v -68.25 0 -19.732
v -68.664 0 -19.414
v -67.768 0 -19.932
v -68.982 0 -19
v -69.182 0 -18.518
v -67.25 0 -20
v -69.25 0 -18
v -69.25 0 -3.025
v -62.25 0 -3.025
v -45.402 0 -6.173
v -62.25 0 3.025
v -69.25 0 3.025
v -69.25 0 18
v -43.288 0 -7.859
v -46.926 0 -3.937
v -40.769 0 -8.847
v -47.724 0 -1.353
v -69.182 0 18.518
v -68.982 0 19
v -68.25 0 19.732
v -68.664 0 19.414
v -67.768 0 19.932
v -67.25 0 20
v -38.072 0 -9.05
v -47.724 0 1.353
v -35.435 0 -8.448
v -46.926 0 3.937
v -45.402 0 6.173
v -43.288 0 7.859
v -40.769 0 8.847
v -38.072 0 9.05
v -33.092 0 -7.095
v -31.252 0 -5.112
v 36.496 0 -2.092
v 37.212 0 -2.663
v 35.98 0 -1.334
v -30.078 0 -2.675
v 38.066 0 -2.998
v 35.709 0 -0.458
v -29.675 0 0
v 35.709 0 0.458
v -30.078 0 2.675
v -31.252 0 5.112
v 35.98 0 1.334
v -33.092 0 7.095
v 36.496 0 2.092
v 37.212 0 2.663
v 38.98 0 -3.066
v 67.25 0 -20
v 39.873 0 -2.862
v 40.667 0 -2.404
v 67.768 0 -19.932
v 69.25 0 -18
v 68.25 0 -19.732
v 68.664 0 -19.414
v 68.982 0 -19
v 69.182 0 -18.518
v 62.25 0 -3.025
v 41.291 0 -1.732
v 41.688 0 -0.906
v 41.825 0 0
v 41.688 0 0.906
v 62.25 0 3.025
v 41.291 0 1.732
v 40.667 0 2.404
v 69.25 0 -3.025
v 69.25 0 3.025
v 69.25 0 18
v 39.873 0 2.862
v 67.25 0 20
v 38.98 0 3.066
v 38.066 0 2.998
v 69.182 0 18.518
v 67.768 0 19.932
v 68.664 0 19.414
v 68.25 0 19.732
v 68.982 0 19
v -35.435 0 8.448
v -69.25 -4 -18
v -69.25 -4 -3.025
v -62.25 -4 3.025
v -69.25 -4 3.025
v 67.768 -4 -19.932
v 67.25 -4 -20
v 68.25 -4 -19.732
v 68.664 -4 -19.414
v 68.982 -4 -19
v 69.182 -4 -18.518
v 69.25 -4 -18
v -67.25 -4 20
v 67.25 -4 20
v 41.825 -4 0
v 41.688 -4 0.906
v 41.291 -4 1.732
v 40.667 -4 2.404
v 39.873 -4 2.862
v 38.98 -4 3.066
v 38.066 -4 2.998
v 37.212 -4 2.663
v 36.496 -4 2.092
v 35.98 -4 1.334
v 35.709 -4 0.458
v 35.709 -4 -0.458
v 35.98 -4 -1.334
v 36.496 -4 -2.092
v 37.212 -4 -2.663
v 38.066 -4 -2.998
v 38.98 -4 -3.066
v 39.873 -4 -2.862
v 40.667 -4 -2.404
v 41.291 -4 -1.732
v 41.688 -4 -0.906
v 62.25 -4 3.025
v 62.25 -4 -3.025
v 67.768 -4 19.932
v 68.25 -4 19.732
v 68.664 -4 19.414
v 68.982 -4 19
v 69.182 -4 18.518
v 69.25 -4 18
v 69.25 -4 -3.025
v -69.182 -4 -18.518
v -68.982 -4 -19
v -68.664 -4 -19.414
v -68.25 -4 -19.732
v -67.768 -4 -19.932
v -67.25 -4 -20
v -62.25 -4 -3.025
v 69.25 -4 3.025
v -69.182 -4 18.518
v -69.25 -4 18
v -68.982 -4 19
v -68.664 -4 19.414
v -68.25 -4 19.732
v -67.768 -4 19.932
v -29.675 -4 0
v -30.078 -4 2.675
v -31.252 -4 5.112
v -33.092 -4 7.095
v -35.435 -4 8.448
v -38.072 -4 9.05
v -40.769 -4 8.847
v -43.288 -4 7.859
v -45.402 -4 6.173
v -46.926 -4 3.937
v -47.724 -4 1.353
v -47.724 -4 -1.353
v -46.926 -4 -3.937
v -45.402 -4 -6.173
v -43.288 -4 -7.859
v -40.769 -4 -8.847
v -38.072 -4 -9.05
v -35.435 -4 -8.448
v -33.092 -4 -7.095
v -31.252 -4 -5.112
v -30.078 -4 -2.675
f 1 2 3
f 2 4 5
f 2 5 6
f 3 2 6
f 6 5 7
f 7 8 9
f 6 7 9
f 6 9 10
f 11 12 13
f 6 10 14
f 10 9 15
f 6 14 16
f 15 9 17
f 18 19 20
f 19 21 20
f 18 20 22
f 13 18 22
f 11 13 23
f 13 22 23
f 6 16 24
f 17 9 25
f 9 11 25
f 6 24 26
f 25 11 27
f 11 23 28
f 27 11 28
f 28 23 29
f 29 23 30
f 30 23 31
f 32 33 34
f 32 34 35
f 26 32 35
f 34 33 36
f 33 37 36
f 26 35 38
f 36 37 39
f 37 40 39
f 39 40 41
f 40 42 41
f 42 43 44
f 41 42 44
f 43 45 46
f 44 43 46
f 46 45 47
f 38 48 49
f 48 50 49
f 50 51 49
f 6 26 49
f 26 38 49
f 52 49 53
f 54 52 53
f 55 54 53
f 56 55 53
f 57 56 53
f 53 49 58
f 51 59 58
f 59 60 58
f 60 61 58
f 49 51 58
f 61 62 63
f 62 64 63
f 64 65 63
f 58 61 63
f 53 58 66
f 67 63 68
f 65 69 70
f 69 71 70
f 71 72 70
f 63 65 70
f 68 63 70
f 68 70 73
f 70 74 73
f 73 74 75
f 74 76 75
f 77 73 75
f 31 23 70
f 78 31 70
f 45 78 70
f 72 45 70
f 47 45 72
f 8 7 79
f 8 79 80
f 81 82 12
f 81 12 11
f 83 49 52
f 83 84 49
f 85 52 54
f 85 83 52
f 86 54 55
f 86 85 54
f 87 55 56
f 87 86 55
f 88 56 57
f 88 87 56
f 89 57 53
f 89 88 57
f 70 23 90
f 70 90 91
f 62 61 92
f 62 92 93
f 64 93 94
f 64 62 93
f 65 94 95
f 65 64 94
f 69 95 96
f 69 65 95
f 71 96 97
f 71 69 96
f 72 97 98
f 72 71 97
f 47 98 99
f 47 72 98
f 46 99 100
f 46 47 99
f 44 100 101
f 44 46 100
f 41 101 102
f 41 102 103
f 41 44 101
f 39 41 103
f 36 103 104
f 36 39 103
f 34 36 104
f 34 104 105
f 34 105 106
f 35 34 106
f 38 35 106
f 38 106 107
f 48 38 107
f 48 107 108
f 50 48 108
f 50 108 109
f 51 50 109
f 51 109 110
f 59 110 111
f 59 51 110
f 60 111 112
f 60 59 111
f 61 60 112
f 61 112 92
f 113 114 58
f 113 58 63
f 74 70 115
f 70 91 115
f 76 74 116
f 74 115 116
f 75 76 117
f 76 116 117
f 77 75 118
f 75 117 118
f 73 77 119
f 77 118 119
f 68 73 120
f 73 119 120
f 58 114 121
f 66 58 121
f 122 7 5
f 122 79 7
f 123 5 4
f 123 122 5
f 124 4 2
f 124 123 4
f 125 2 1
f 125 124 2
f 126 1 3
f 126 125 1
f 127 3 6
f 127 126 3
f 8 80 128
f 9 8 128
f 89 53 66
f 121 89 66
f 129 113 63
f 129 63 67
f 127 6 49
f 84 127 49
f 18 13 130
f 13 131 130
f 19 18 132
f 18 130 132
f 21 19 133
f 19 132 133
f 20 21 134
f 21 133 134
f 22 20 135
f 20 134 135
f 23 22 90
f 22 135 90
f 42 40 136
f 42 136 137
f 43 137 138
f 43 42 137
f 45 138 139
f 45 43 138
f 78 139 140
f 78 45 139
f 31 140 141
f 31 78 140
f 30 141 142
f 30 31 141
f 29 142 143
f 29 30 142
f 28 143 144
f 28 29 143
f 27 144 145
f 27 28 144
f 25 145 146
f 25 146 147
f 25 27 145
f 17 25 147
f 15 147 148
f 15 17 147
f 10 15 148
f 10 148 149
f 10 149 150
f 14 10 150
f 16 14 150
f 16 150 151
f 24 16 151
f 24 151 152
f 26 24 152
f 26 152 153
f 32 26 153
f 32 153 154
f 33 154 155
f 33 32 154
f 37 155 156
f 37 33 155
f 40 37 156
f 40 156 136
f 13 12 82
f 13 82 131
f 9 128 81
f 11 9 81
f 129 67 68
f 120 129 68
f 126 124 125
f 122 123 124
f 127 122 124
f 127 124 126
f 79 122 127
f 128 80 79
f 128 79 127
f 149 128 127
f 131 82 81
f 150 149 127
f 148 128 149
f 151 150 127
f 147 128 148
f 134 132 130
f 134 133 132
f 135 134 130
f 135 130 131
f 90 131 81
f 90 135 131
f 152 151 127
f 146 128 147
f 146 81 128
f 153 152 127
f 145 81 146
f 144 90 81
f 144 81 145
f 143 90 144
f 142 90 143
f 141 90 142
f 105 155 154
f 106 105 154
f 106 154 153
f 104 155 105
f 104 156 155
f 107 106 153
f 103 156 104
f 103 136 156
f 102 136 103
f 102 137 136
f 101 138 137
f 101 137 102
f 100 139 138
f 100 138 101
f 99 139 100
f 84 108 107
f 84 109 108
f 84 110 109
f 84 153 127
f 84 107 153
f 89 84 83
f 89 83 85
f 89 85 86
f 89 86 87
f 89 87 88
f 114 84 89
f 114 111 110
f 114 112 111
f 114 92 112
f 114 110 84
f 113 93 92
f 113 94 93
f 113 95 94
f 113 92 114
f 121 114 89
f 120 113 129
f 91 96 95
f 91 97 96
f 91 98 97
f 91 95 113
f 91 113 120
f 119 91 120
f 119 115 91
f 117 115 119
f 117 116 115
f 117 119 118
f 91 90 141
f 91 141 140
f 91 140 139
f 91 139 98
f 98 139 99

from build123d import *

# Parameters (mm, degrees)
F0_W     = 138.5
F0_H     = 40
F0_R     = 9.075
F0_R_2   = 3.075
F1_DEPTH = 4
F2_R     = 2
F3_W     = 7
F3_H     = 6.05
F4_DEPTH = 25


with BuildPart() as f1:
    # F0 (on Front) → F1 (new body)
    with BuildSketch(Plane.XZ):
        Rectangle(F0_W, F0_H)
        with Locations((-38.75, 0)):
            Circle(F0_R, mode=Mode.SUBTRACT)
        with Locations((38.75, 0)):
            Circle(F0_R_2, mode=Mode.SUBTRACT)
    extrude(amount=F1_DEPTH)

    # F2
    f2_edges = [f1.edges().sort_by_distance(p)[0] for p in [
        (-69.25, -2, -20),
        (-69.25, -2, 20),
        (69.25, -2, -20),
        (69.25, -2, 20),
    ]]
    fillet(f2_edges, radius=F2_R)

    # F3 (on face) → F4 (cut)
    with BuildSketch(Plane.XZ.offset(4)):
        with Locations((-65.75, 0)):
            Rectangle(F3_W, F3_H)
        with Locations((65.75, 0)):
            Rectangle(F3_W, F3_H)
    extrude(amount=-F4_DEPTH, mode=Mode.SUBTRACT)


solid = f1.part
